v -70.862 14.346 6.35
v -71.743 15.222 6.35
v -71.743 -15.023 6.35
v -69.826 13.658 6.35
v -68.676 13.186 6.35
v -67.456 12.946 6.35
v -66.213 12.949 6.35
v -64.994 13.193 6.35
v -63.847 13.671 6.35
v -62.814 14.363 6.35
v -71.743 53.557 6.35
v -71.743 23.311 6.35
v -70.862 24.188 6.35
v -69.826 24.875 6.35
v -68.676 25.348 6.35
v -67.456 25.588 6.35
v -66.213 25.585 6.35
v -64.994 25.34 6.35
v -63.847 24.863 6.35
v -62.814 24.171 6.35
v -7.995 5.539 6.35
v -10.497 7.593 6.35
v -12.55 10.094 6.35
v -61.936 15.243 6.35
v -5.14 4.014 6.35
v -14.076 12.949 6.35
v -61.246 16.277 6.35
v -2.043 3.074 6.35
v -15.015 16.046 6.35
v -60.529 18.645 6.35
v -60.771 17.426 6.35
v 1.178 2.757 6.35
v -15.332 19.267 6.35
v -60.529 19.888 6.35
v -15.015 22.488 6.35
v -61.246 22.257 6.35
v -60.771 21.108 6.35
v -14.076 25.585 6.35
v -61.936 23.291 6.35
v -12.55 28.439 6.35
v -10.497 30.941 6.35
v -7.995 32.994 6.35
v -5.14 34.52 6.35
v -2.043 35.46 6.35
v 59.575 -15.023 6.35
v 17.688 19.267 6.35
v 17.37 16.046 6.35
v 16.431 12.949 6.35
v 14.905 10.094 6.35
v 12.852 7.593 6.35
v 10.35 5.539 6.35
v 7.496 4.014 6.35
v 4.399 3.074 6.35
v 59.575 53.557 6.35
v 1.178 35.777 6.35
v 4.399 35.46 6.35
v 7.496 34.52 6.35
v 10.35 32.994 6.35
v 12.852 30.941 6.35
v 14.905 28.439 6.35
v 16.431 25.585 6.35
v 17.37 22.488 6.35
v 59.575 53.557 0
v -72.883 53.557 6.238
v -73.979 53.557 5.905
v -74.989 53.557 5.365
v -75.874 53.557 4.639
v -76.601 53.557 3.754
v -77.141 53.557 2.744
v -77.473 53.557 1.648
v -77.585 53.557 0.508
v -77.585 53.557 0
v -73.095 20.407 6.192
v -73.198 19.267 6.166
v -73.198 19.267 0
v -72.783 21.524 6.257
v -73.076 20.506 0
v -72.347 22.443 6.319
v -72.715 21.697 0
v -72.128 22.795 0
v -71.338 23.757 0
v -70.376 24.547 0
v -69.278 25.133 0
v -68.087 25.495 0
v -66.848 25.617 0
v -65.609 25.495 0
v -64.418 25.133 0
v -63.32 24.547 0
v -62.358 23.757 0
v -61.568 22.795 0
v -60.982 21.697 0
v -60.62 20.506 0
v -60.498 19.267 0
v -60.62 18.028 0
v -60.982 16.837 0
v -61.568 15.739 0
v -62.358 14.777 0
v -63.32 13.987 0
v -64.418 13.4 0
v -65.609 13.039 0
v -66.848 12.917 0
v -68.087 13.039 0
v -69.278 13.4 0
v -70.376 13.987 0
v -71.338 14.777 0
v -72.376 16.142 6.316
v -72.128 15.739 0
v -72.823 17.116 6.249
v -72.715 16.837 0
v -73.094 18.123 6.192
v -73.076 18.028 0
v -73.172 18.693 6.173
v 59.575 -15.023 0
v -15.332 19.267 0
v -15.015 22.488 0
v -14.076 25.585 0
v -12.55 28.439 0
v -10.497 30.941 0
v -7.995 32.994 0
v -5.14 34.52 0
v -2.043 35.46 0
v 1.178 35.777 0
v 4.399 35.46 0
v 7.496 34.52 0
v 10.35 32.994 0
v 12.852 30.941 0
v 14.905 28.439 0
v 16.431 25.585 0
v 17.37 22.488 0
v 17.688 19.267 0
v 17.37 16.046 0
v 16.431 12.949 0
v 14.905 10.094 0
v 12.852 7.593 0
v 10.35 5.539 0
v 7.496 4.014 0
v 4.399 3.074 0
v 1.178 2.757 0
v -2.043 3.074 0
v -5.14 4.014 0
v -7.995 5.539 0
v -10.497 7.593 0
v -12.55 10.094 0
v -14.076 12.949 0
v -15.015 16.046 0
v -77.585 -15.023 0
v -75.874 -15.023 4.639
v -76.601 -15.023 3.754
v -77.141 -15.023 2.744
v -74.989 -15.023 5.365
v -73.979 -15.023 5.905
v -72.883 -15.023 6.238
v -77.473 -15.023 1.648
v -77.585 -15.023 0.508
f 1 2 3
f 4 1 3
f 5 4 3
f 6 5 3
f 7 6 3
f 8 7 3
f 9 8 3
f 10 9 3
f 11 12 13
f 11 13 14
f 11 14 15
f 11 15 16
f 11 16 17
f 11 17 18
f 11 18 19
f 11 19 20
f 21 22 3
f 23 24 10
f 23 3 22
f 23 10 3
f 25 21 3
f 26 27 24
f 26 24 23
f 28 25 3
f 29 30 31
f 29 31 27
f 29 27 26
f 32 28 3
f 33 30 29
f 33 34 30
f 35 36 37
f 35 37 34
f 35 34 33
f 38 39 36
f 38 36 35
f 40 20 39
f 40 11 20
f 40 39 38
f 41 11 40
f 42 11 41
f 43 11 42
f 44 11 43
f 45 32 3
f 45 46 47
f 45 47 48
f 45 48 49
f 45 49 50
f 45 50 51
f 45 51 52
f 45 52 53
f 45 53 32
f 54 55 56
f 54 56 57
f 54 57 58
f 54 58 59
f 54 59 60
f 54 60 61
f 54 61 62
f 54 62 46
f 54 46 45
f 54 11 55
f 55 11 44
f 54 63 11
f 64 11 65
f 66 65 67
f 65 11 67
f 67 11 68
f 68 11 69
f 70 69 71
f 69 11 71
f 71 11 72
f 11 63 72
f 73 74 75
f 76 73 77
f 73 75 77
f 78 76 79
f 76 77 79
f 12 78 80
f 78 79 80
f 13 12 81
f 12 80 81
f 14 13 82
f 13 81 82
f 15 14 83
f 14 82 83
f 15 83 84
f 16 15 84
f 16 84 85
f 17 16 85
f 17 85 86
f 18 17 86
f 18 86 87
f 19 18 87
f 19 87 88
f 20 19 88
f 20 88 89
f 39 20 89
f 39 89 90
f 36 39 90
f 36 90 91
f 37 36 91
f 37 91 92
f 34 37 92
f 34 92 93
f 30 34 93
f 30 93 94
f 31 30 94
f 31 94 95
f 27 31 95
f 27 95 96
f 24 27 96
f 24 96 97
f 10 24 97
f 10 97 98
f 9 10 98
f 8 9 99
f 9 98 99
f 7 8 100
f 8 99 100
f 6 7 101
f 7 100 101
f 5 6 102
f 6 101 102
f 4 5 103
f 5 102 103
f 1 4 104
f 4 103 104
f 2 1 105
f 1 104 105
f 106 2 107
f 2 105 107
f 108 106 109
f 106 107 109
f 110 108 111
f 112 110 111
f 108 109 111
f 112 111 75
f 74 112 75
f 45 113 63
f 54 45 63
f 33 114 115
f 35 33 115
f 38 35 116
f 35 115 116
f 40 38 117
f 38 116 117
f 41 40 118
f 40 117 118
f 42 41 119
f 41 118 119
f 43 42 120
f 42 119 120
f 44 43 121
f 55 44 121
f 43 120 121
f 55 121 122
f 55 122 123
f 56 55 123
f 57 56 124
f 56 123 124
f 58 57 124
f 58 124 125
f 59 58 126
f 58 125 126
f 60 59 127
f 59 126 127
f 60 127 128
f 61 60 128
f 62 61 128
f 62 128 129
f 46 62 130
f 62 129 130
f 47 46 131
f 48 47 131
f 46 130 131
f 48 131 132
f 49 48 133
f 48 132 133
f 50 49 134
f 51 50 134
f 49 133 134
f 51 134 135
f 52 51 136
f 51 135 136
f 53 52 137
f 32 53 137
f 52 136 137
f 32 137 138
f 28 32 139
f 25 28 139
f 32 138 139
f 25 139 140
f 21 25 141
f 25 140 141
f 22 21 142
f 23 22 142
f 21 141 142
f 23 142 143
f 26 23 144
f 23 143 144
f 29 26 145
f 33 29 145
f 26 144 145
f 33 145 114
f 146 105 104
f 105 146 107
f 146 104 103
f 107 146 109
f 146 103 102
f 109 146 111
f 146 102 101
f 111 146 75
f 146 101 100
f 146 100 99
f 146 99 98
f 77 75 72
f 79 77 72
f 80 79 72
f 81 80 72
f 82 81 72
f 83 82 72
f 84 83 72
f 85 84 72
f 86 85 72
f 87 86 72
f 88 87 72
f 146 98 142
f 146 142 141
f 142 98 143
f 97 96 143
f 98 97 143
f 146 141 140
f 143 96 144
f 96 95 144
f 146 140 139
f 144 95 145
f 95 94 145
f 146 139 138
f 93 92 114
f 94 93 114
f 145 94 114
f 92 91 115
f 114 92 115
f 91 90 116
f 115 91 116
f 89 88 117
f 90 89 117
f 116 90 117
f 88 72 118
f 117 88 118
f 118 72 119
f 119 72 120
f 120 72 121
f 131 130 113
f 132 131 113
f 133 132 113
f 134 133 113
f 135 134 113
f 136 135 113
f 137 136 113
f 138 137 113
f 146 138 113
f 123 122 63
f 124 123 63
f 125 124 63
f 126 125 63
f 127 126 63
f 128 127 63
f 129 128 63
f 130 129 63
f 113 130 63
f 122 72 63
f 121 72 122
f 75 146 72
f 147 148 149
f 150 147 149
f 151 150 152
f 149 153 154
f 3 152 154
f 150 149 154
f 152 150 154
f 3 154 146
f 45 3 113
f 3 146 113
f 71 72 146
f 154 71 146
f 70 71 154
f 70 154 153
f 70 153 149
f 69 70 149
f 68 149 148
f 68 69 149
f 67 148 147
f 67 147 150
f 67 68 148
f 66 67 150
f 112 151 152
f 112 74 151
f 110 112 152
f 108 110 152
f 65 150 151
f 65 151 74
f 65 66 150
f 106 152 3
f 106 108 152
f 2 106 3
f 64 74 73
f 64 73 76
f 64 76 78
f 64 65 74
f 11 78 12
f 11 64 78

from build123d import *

# Parameters (mm, degrees)
F1_DEPTH    = 6.35
F2_T1_DEPTH = 97.79


# Not quite as in the source:
# - a fillet or chamfer that OpenCascade refuses, or shapes differently, is made with other operations: its cross-section is extruded or revolved along the edge and cut away or added


with BuildPart() as f1:
    # F0 (on Top) → F1 (new body)
    with BuildSketch(Plane.XY):
        with BuildLine():
            Line((-77.5854553002, 19.2668606828), (-77.5854553002, -15.0231393172))
            Line((-77.5854553002, -15.0231393172), (59.5745446998, -15.0231393172))
            Line((59.5745446998, -15.0231393172), (59.5745446998, 19.2668606828))
            Line((59.5745446998, 19.2668606828), (17.687636208, 19.2668606828))
            ThreePointArc((17.687636208, 19.2668606828), (1.177636208, 2.7568606828), (-15.332363792, 19.2668606828))
            Line((-15.332363792, 19.2668606828), (-60.4981811881, 19.2668606828))
            ThreePointArc((-60.4981811881, 19.2668606828), (-66.8481811881, 12.9168606828), (-73.1981811881, 19.2668606828))
            Line((-73.1981811881, 19.2668606828), (-77.5854553002, 19.2668606828))
        make_face()
        with BuildLine():
            Line((-77.5854553002, 53.5568606828), (-77.5854553002, 19.2668606828))
            Line((-77.5854553002, 19.2668606828), (-73.1981811881, 19.2668606828))
            ThreePointArc((-73.1981811881, 19.2668606828), (-66.8481811881, 25.6168606828), (-60.4981811881, 19.2668606828))
            Line((-60.4981811881, 19.2668606828), (-15.332363792, 19.2668606828))
            ThreePointArc((-15.332363792, 19.2668606828), (1.177636208, 35.7768606828), (17.687636208, 19.2668606828))
            Line((17.687636208, 19.2668606828), (59.5745446998, 19.2668606828))
            Line((59.5745446998, 19.2668606828), (59.5745446998, 53.5568606828))
            Line((59.5745446998, 53.5568606828), (-77.5854553002, 53.5568606828))
        make_face()
    extrude(amount=F1_DEPTH)

    # F2: fillet of radius 5.842 on 1 edges, made by hand

    # F2_s2 → F2_t1 (cut)
    with BuildSketch(Plane.XZ.offset(-68.1618606828)):
        with BuildLine():
            ThreePointArc((-77.5854553002, 0.508), (-75.8743731159, 4.6389178157), (-71.7434553002, 6.35))
            Line((-71.7434553002, 6.35), (-77.5854553002, 6.35))
            Line((-77.5854553002, 6.35), (-77.5854553002, 0.508))
        make_face()
    extrude(amount=F2_T1_DEPTH, mode=Mode.SUBTRACT)


solid = f1.part
